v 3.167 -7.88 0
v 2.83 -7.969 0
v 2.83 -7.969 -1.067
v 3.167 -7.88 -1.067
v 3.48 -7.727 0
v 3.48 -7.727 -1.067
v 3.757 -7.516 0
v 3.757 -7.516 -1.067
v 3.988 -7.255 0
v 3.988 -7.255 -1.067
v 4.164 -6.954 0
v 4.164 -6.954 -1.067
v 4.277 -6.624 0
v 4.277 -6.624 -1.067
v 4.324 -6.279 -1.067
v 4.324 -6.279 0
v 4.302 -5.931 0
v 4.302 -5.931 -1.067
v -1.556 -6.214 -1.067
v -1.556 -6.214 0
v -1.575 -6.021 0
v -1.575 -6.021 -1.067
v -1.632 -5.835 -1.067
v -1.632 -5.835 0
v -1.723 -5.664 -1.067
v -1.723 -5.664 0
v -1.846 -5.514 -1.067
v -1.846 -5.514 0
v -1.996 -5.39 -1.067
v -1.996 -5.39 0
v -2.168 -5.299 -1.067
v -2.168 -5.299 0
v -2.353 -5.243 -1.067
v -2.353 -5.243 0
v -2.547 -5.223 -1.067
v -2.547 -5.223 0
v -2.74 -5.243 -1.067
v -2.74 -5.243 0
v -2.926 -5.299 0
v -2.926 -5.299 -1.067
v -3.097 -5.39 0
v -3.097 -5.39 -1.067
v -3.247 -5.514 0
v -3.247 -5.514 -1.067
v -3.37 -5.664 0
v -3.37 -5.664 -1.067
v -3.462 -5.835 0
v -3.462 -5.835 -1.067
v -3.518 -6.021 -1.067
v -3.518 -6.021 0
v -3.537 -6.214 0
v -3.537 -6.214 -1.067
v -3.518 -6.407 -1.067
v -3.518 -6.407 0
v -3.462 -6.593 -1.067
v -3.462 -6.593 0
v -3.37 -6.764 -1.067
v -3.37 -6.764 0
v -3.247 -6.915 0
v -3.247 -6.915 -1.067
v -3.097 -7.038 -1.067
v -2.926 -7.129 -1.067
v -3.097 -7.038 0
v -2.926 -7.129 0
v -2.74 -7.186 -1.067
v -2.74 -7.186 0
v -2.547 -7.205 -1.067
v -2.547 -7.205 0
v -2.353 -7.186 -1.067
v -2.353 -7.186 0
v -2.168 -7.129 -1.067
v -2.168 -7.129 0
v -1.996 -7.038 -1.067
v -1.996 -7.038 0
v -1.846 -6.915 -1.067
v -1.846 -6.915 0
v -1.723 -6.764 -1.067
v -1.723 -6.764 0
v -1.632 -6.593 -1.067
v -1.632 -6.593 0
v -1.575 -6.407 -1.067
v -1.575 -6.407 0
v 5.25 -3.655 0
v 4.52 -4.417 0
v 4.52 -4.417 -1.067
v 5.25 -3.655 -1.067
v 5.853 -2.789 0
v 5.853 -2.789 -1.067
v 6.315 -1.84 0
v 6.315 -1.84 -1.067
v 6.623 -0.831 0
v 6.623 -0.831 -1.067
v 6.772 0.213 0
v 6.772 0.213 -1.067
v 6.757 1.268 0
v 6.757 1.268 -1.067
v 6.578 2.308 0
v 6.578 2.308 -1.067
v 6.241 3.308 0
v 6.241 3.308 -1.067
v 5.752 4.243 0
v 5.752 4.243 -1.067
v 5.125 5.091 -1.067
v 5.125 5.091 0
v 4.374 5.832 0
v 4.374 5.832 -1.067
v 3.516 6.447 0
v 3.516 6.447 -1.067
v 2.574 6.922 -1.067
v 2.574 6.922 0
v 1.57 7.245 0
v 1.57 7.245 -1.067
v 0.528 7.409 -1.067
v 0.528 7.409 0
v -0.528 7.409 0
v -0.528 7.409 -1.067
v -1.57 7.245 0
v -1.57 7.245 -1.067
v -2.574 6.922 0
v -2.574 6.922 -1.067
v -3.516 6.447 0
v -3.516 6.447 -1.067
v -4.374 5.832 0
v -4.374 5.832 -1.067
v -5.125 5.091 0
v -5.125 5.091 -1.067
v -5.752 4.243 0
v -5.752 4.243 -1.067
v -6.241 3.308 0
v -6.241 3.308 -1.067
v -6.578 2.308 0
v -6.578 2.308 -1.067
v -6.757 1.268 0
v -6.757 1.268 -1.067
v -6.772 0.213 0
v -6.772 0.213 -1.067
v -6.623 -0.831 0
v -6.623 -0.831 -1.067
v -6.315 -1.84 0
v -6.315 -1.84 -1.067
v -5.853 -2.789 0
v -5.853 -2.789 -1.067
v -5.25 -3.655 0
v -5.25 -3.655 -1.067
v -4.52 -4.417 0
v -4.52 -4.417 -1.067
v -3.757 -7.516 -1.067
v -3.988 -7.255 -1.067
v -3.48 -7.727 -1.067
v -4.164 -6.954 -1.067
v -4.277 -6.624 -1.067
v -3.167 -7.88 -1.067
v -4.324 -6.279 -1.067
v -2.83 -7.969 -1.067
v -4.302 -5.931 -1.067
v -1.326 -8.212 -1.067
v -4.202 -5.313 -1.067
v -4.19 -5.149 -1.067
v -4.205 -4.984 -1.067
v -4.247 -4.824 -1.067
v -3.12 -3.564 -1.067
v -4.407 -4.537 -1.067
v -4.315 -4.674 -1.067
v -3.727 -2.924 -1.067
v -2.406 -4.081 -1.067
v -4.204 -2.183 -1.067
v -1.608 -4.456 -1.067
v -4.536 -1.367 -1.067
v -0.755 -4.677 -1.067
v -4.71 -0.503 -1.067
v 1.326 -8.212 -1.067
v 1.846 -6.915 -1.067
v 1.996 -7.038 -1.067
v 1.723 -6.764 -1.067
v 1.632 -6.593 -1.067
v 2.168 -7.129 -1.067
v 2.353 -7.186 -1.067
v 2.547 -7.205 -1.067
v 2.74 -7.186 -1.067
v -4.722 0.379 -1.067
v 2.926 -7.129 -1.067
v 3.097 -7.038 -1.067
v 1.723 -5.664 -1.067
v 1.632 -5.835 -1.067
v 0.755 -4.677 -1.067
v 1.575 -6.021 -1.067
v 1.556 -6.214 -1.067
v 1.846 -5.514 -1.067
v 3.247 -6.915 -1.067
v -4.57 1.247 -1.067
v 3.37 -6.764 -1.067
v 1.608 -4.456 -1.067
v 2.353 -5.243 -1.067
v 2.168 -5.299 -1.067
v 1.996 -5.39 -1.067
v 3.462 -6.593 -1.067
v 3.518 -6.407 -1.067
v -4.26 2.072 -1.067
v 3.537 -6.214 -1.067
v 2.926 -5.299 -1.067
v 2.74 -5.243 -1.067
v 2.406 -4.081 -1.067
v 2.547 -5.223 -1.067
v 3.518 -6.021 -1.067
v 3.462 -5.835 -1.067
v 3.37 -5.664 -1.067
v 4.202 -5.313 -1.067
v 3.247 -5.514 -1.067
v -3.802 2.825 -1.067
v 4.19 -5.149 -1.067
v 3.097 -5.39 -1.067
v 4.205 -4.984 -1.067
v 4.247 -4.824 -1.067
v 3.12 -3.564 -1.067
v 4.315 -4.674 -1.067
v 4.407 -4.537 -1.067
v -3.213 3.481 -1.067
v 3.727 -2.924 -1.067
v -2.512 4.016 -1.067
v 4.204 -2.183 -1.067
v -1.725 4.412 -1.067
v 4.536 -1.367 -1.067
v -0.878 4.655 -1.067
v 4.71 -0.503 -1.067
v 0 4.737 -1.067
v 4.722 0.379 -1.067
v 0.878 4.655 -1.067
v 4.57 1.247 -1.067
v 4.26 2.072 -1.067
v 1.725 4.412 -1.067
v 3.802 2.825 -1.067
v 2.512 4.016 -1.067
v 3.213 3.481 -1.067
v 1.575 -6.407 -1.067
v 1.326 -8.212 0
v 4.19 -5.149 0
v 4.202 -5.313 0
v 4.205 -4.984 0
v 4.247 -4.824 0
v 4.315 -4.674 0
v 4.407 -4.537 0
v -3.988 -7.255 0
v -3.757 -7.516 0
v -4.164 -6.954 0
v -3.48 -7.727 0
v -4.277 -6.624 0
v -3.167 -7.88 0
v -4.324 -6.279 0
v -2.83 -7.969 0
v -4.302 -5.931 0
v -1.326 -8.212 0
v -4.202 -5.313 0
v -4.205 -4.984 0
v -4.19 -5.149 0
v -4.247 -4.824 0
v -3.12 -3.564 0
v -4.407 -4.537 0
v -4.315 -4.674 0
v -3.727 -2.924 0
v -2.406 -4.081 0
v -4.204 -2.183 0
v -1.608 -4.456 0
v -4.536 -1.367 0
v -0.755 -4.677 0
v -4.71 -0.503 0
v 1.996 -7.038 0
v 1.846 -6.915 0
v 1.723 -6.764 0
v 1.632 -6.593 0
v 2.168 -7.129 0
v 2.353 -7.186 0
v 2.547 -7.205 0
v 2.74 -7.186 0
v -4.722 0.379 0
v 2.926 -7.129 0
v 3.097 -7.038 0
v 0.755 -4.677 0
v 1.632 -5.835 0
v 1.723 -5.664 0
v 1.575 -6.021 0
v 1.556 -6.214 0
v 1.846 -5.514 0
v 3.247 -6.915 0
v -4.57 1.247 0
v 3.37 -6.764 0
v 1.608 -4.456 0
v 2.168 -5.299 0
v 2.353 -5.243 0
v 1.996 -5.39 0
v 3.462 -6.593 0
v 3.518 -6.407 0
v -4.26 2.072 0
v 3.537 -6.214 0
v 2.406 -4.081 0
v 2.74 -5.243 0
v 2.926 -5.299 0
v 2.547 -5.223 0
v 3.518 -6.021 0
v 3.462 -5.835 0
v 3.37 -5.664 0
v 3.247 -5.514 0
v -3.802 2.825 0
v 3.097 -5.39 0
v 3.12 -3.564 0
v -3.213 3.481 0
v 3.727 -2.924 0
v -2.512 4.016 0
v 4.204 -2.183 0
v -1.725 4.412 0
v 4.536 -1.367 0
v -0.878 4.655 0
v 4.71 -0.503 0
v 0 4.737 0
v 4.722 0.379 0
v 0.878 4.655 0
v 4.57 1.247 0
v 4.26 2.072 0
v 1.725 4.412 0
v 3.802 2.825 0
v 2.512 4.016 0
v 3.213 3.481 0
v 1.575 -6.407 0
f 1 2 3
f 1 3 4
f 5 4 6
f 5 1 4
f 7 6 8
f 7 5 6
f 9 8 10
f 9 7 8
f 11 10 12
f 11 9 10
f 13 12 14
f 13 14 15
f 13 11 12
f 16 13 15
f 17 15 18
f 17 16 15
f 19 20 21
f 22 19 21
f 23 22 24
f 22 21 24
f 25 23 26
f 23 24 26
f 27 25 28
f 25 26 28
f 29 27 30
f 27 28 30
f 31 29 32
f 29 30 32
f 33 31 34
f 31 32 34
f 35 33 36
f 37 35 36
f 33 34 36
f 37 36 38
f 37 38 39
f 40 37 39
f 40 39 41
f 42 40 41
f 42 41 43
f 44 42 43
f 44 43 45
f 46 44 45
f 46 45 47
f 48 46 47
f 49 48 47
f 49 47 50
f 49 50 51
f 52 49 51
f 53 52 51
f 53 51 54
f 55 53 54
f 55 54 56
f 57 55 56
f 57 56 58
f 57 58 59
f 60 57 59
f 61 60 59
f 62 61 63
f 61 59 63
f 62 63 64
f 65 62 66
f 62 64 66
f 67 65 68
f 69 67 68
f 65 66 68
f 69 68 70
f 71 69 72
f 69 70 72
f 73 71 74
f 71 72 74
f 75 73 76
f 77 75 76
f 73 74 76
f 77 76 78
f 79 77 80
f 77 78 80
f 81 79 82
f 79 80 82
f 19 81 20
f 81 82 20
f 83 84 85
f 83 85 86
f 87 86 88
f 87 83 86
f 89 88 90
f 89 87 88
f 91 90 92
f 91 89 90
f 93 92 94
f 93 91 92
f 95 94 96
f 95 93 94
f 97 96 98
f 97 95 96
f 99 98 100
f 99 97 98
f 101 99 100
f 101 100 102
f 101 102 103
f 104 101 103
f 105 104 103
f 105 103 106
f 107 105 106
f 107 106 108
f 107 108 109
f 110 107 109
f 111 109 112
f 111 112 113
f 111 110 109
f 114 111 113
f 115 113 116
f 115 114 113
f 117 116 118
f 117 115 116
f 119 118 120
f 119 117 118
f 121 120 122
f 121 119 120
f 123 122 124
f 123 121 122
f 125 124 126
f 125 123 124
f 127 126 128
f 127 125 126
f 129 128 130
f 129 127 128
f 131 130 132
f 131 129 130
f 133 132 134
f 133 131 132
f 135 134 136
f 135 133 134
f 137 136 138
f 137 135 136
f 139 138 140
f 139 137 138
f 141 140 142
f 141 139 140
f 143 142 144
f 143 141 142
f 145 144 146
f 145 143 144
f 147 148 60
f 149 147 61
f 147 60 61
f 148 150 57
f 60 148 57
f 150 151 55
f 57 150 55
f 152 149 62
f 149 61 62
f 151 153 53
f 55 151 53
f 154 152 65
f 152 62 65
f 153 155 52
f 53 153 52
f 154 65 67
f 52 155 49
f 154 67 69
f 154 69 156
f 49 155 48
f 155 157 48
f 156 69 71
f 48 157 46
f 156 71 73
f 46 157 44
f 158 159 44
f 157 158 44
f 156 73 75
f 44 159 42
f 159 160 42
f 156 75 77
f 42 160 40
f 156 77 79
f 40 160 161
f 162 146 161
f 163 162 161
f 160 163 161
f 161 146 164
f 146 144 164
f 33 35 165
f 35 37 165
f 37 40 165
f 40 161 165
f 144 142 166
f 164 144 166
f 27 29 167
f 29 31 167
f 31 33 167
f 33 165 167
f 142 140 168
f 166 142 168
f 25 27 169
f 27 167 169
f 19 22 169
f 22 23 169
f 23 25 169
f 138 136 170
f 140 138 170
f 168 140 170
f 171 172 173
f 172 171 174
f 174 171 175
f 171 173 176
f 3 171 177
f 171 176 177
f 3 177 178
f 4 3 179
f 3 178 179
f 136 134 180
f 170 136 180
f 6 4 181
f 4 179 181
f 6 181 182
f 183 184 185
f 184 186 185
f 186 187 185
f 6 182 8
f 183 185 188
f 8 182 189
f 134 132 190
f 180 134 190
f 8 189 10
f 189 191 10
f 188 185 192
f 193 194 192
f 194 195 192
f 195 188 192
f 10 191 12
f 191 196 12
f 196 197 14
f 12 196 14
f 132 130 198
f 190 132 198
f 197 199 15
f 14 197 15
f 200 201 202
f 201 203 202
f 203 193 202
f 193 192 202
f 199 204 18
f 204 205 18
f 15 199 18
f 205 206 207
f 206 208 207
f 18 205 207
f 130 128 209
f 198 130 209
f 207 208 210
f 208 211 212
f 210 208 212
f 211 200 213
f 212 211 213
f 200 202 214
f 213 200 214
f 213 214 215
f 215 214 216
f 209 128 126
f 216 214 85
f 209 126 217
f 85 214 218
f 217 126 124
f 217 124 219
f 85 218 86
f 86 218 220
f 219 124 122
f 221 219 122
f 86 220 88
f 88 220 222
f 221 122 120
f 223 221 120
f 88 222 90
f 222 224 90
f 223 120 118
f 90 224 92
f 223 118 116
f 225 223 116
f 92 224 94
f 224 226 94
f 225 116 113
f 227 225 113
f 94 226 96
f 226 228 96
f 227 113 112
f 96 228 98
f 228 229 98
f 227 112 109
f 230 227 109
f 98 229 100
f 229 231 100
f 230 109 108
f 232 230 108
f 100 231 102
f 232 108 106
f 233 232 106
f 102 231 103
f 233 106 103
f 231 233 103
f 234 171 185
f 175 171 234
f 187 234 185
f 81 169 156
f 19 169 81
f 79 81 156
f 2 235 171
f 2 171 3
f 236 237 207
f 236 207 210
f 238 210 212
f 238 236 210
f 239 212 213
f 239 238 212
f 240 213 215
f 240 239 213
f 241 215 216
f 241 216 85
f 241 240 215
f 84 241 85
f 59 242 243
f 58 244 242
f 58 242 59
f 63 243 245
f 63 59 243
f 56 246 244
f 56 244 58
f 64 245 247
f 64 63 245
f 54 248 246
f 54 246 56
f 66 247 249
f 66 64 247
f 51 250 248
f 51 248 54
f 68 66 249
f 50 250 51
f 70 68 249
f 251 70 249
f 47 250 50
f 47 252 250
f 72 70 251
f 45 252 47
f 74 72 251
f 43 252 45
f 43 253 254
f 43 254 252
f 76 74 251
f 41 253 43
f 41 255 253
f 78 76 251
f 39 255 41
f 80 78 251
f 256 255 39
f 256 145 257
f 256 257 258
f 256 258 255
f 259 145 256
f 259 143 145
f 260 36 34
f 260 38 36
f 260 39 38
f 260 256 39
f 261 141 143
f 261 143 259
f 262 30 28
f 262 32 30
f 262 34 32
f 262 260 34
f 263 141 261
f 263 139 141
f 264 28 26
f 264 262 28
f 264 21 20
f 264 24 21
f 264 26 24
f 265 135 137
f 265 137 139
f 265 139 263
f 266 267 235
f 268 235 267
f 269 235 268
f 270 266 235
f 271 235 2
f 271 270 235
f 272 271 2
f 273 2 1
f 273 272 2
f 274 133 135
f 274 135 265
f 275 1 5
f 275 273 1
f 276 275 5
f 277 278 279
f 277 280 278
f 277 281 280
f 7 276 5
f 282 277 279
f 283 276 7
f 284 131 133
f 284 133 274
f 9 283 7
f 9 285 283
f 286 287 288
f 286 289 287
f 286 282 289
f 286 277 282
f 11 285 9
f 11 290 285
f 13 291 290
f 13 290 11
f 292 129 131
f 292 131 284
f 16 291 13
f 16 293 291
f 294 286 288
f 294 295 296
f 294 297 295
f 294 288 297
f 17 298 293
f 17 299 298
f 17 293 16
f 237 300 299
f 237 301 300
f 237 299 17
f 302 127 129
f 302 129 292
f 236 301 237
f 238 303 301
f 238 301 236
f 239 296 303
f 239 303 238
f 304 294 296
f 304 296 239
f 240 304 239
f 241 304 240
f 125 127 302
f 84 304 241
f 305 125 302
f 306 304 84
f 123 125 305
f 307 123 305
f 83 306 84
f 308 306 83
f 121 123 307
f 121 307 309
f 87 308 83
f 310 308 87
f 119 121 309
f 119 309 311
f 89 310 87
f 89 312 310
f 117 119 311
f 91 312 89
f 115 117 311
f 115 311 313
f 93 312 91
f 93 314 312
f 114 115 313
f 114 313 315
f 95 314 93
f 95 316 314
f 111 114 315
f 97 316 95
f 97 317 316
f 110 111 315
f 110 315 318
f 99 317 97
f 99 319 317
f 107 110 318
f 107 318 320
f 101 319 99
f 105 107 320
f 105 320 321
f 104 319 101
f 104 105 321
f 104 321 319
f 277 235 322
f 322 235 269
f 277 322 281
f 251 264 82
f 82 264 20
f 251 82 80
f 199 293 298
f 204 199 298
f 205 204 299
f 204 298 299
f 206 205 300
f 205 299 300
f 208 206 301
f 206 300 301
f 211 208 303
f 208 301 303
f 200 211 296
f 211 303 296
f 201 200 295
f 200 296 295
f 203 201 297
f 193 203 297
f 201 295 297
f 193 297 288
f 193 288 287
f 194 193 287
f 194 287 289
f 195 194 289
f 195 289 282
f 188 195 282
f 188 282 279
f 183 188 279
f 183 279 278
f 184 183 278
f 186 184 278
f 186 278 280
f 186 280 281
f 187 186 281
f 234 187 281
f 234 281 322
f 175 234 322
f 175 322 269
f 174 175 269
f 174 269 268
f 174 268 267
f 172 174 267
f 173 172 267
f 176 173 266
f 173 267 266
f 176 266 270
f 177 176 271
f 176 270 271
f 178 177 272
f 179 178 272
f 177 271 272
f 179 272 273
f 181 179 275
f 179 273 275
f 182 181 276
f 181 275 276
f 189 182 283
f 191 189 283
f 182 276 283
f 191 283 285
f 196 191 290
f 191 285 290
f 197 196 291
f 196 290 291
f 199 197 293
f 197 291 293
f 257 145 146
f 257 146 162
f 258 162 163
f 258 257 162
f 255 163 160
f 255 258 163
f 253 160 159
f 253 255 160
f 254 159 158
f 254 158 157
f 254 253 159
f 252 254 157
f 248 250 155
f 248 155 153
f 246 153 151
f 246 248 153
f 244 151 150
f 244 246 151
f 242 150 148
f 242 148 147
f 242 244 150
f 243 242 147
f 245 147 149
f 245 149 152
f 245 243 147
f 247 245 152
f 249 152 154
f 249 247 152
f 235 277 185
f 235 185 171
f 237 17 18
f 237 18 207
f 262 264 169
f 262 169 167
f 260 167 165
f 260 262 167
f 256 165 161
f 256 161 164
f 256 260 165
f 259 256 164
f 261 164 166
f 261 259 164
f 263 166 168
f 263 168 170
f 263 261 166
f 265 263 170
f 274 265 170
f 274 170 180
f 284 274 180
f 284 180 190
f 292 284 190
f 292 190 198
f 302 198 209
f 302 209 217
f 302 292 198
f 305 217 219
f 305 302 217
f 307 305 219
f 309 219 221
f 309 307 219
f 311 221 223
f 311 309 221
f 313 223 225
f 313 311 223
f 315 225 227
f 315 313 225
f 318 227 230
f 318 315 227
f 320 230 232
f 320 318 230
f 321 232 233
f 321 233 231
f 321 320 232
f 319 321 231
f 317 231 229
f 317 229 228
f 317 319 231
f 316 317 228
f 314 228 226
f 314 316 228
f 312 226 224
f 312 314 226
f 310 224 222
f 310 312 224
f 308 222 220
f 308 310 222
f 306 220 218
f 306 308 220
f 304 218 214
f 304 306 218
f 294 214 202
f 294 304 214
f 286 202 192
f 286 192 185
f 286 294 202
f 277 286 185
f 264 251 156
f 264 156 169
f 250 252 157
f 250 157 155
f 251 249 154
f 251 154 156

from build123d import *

# Parameters (mm, degrees)
BODY_DEPTH  = 1.0668
HOLSKE_R    = 0.9906
HOLES_DEPTH = 2.0668


with BuildPart() as part:
    # BodySke → Body (new body)
    with BuildSketch(Plane.XY):
        with BuildLine():
            Line((0.754834919, -4.676573602), (1.325514402, -8.212213698))
            Line((1.325514402, -8.212213698), (2.830042103, -7.969371365))
            ThreePointArc((2.830042103, -7.969371365), (3.988232781, -7.254926373), (4.302008364, -5.930772992))
            Line((4.302008364, -5.930772992), (4.202374684, -5.313493335))
            ThreePointArc((4.202374684, -5.313493335), (4.246706733, -4.824497903), (4.520407312, -4.416858533))
            ThreePointArc((4.520407312, -4.416858533), (0, 7.4295), (-4.520407312, -4.416858533))
            ThreePointArc((-4.520407312, -4.416858533), (-4.246706733, -4.824497903), (-4.202374684, -5.313493335))
            Line((-4.202374684, -5.313493335), (-4.302008364, -5.930772992))
            ThreePointArc((-4.302008364, -5.930772992), (-3.988232781, -7.254926373), (-2.830042103, -7.969371365))
            Line((-2.830042103, -7.969371365), (-1.325514402, -8.212213698))
            Line((-1.325514402, -8.212213698), (-0.754834919, -4.676573602))
            ThreePointArc((-0.754834919, -4.676573602), (0, 4.7371), (0.754834919, -4.676573602))
        make_face()
    extrude(amount=-BODY_DEPTH)

    # HolSke → Holes (cut, through all)
    with BuildSketch(Plane.XY):
        with Locations((2.546726047, -6.214089047)):
            Circle(HOLSKE_R)
        with Locations((-2.546726047, -6.214089047)):
            Circle(HOLSKE_R)
    extrude(amount=-HOLES_DEPTH, mode=Mode.SUBTRACT)


solid = part.part
